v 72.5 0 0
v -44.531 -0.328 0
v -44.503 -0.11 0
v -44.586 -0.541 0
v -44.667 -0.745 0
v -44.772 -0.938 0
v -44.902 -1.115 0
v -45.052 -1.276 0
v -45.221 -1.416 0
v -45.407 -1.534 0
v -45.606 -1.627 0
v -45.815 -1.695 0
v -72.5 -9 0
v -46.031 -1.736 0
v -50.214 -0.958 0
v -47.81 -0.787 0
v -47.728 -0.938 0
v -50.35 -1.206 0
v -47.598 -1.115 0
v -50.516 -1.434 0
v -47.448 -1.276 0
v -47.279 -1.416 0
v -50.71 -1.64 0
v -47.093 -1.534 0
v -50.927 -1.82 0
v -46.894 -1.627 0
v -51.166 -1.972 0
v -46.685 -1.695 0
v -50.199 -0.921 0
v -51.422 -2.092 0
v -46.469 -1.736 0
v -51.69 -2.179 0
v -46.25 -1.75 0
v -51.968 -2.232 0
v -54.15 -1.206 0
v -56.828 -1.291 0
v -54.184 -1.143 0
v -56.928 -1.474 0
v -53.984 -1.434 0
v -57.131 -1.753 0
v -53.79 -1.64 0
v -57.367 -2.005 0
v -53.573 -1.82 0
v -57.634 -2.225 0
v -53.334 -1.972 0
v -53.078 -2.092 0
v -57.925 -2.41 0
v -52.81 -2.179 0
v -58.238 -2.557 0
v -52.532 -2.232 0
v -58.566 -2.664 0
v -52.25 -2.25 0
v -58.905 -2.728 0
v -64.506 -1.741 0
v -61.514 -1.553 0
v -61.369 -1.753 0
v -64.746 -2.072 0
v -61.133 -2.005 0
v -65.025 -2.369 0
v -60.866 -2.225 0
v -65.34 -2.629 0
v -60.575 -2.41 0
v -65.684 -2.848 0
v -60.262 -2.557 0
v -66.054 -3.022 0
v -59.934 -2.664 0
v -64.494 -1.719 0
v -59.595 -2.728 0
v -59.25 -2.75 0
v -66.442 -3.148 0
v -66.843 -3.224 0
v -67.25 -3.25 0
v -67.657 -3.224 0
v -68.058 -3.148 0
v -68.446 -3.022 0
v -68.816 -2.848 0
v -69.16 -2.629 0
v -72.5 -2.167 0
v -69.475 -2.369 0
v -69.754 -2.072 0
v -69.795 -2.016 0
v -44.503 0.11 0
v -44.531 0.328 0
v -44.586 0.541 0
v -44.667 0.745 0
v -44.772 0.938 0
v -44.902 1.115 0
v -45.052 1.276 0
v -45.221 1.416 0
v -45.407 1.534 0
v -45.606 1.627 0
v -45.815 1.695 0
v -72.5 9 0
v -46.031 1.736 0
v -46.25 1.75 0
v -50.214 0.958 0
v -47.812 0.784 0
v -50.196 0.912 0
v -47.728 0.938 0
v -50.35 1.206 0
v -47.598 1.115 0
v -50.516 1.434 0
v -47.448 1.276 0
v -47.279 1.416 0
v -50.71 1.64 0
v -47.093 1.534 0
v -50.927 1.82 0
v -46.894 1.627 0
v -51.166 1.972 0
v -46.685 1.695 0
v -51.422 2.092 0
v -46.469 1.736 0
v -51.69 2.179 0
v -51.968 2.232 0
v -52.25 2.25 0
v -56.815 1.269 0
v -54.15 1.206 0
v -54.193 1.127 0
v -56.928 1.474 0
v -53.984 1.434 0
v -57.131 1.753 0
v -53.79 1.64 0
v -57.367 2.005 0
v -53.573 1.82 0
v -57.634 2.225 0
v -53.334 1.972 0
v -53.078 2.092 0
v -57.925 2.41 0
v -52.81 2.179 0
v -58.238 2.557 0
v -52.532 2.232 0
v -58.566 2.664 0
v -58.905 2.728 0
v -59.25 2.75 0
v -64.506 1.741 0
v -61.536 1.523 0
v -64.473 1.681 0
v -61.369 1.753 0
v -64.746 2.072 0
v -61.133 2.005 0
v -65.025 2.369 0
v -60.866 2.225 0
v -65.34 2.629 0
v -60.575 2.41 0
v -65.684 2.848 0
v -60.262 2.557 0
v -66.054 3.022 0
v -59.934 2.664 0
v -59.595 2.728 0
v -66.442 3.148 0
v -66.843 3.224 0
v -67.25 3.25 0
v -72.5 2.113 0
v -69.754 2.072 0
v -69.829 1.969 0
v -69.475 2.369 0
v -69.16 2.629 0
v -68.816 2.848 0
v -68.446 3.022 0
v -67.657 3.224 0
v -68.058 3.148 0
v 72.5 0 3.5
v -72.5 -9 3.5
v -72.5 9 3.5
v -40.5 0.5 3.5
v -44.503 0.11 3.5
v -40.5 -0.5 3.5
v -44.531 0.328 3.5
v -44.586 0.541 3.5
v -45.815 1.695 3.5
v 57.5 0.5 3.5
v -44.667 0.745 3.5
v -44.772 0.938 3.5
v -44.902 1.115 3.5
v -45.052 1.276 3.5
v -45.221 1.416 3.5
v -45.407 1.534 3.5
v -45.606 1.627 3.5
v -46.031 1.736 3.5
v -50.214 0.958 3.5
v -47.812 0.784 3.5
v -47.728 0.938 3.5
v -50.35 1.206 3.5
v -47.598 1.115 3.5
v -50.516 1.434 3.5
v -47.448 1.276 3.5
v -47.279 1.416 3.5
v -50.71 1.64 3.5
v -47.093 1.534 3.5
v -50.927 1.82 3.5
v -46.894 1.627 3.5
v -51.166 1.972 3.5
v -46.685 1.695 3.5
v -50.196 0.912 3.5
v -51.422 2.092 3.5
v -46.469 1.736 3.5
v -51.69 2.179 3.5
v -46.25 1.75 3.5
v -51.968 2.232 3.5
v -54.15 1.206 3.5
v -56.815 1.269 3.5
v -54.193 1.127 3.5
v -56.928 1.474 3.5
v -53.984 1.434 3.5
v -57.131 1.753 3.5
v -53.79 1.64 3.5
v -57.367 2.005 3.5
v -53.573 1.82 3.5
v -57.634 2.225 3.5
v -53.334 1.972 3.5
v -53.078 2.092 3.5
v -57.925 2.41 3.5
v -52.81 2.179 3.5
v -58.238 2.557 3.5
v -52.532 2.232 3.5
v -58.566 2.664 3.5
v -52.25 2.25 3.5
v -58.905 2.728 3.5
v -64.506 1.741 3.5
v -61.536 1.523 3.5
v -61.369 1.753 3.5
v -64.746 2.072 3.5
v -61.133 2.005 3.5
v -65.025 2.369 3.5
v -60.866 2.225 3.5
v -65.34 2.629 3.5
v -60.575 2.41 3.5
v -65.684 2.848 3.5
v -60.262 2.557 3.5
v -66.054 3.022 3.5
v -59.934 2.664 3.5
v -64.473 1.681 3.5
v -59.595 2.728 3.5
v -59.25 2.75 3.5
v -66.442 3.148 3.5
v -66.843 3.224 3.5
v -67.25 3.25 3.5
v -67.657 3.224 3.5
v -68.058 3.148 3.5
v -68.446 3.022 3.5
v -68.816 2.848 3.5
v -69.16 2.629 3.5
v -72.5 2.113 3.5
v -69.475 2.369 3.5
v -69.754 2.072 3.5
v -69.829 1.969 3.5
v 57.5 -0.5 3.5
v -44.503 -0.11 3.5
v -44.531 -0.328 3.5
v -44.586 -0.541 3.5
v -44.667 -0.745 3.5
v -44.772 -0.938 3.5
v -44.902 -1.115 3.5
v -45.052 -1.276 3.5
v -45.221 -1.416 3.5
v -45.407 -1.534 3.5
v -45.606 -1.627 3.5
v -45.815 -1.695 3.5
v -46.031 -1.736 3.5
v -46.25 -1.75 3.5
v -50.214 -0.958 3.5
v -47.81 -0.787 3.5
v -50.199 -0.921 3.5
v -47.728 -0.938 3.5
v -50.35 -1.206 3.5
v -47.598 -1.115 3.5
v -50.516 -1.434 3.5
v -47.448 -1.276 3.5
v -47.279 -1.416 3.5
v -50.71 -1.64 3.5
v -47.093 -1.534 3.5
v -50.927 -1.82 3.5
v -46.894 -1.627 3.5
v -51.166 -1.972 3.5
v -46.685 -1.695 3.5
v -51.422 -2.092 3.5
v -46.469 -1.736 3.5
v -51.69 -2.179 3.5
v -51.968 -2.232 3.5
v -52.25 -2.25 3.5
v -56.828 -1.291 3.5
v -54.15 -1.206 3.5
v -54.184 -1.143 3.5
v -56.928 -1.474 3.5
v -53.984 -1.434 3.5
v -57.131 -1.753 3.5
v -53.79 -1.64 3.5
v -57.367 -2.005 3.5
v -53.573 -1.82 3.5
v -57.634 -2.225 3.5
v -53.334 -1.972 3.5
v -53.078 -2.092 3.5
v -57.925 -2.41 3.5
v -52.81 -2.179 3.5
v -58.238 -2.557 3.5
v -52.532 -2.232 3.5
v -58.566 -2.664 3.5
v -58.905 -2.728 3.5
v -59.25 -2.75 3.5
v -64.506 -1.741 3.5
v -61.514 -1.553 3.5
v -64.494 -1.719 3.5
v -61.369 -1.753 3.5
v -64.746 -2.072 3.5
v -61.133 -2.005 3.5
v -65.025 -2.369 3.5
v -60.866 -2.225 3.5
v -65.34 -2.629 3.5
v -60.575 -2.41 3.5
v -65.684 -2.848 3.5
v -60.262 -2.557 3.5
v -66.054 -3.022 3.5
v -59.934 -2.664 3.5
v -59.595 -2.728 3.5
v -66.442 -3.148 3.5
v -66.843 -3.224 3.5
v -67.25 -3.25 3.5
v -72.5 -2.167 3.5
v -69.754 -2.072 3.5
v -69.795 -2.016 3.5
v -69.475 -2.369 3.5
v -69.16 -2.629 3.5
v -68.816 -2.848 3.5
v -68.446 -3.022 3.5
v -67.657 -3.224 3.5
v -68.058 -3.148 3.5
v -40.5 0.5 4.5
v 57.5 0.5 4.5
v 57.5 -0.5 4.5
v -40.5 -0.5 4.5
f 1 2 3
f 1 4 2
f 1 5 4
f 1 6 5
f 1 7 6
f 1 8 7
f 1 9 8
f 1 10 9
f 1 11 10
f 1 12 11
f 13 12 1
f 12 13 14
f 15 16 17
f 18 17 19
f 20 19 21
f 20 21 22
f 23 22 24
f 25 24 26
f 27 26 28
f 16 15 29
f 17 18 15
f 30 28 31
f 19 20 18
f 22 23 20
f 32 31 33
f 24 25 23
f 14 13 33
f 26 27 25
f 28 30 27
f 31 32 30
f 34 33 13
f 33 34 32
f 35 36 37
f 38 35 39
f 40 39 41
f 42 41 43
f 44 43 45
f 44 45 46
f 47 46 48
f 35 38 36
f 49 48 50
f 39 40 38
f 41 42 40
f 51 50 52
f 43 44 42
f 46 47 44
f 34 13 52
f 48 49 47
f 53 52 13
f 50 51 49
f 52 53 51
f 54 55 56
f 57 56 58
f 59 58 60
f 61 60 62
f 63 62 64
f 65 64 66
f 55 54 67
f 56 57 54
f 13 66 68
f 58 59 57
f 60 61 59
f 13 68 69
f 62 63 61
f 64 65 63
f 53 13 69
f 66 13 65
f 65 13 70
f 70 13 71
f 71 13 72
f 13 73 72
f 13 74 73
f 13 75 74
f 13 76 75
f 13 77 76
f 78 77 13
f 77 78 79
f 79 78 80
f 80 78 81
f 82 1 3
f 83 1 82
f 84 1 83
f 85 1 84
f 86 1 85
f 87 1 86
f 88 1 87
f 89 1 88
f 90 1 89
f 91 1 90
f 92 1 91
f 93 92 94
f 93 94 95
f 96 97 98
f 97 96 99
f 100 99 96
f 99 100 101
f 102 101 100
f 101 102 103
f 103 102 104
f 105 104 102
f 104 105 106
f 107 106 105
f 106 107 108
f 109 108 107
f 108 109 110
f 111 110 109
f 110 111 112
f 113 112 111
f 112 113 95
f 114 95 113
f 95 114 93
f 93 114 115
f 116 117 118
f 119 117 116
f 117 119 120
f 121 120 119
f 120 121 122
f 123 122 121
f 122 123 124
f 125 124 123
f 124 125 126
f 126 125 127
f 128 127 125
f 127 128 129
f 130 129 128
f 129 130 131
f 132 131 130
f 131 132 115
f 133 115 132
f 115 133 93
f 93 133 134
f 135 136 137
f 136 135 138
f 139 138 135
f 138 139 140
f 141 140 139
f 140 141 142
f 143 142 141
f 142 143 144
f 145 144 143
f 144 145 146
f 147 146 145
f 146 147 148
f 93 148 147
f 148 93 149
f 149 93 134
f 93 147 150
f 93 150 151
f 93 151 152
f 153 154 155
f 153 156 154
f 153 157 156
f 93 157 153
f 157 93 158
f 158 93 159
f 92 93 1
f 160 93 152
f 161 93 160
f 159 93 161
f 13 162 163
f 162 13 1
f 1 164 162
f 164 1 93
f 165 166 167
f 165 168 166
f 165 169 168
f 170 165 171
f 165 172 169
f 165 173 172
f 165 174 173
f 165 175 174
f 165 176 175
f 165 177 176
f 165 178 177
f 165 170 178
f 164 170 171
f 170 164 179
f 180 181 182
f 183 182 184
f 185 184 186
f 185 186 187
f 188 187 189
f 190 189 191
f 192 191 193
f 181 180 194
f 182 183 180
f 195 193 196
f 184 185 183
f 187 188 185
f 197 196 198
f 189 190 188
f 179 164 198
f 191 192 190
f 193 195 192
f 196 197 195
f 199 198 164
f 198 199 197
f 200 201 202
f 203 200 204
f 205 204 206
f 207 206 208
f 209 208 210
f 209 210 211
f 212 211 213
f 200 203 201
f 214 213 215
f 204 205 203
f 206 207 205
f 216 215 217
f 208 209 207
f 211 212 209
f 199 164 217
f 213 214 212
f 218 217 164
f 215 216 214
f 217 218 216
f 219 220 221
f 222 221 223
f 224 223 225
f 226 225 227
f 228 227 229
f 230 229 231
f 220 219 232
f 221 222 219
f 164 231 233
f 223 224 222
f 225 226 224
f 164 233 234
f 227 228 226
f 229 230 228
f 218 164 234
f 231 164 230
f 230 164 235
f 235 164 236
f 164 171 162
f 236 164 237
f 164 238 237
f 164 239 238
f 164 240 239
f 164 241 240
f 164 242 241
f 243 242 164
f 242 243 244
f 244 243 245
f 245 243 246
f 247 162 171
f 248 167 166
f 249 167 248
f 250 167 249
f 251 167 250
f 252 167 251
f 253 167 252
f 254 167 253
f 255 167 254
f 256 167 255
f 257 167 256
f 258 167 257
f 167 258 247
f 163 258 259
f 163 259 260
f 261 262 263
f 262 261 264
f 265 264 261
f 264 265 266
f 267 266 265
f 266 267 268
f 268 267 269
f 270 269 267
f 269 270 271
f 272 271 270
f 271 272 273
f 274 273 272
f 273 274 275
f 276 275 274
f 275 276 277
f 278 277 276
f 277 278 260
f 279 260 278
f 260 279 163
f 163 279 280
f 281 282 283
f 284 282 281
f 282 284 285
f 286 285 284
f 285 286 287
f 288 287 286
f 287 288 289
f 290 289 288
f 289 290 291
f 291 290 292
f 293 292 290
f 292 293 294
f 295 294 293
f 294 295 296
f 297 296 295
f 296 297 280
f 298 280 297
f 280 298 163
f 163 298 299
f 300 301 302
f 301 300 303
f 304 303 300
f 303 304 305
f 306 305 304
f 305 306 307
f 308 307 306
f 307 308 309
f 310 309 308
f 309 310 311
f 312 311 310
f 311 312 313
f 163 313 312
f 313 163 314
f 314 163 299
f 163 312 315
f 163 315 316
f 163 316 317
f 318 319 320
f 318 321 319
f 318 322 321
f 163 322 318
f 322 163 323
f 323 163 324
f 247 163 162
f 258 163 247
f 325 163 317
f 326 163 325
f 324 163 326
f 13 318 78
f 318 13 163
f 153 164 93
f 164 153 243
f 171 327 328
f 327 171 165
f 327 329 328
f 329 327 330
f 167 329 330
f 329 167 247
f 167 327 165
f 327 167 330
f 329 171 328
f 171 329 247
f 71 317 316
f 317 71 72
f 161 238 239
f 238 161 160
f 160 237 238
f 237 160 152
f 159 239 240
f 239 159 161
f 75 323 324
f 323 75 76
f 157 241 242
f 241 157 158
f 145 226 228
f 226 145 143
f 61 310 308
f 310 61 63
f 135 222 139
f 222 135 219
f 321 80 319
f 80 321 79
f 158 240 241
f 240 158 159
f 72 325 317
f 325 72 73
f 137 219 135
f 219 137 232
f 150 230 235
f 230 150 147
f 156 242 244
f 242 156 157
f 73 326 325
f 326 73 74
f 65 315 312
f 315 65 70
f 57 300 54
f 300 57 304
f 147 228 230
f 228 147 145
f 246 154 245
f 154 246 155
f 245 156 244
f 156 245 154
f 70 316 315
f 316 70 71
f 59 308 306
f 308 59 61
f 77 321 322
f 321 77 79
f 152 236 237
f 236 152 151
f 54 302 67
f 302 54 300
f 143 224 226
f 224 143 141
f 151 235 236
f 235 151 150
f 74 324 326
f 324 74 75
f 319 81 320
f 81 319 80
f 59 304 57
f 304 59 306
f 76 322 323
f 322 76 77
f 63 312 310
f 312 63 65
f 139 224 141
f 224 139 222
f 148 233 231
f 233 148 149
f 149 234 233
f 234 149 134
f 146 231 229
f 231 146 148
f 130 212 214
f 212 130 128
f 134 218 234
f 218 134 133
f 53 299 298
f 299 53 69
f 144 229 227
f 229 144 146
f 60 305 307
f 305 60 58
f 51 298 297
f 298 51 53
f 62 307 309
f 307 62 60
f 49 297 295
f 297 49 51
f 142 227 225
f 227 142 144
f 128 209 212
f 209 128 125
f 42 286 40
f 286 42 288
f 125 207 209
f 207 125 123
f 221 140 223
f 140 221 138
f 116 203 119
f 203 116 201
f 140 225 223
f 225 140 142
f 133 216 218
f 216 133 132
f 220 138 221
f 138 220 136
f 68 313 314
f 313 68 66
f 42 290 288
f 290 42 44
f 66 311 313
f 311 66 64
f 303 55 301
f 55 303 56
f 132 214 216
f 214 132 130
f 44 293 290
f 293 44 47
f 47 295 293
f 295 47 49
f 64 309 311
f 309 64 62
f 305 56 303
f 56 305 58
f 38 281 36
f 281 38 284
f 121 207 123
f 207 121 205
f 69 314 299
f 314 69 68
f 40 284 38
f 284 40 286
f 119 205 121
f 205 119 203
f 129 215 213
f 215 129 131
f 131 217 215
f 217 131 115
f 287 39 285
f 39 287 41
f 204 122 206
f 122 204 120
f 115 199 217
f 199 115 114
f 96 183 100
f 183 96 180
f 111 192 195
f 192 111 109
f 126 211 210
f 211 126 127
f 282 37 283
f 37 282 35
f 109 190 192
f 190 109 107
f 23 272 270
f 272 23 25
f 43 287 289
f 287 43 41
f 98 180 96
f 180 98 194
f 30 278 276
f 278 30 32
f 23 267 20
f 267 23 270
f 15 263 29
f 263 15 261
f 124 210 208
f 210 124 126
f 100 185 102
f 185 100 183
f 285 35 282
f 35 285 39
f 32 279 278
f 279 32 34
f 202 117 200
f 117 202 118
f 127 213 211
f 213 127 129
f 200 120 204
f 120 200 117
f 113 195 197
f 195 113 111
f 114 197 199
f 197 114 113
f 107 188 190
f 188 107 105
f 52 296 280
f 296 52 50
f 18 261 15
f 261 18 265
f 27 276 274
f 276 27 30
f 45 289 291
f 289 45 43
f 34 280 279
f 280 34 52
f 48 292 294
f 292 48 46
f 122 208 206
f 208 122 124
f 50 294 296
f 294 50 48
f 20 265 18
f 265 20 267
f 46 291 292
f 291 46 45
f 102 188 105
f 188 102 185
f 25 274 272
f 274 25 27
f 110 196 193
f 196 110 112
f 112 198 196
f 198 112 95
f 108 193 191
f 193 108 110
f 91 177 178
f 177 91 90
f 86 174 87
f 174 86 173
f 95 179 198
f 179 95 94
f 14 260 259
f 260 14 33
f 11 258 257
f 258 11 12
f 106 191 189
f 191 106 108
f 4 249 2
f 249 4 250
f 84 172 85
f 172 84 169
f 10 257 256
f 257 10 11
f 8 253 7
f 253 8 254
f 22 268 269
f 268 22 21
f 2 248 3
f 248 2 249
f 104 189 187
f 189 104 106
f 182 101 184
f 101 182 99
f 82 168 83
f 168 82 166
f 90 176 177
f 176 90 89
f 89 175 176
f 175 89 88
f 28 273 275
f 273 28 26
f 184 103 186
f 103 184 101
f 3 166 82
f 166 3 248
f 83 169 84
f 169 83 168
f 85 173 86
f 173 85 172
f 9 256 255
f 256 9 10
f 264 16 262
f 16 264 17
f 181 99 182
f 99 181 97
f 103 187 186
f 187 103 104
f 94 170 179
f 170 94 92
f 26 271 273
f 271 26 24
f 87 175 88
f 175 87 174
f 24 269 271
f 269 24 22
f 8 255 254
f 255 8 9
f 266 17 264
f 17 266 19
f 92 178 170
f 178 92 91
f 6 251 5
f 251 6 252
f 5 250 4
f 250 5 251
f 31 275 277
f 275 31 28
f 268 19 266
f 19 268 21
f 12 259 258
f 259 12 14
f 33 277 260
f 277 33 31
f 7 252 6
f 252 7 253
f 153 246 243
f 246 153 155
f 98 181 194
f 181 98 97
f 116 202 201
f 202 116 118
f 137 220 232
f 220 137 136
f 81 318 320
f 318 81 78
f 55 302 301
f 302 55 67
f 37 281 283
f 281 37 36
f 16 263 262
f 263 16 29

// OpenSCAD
// Garden irrigation hose stake 2 by Brian Enigma

// This is the thickest part, up at the top of the stake
OUTSIDE_DIAMETER = 18;

// This is the overall length of the stake
LENGTH = 145;

// This is the height (or thickness, depending on how you look at it) of the
// tallest part of the stake -- the bar running its length.
HEIGHT = 4.5;

// This is the thickness of all the rest of the stake that isn't a reinforcing
// ring or bar.
THICKNESS = 3.5;

// These are the diameters of the four circles.
CIRCLE1 = 6.5;
CIRCLE2 = 5.5;
CIRCLE3 = 4.5;
CIRCLE4 = 3.5;

// The detail (number of sides) of the circles.
DETAIL = 50;

// ######################################################################

CIRCLE1_OFFSET = CIRCLE1 / 2 + 2;
CIRCLE2_OFFSET = CIRCLE1 + 2 + CIRCLE2 / 2 + 2;
CIRCLE3_OFFSET = CIRCLE1 + 2 + CIRCLE2 + 2 + CIRCLE3 / 2 + 2;
CIRCLE4_OFFSET = CIRCLE1 + 2 + CIRCLE2 + 2 + CIRCLE3 + 2 + CIRCLE4 / 2 + 2;
BAR_OFFSET = CIRCLE4_OFFSET + CIRCLE4 / 2 + 4;
BAR_LENGTH = LENGTH - BAR_OFFSET - 15;

module body()
{
    union()
    {
        linear_extrude(height = THICKNESS)
            polygon(points = [[OUTSIDE_DIAMETER / 2, 0], [0, -1 * LENGTH], [OUTSIDE_DIAMETER / -2, 0]]);
        translate(v = [ -0.5, -1 * BAR_OFFSET - BAR_LENGTH, 0 ]) cube(size = [ 1, BAR_LENGTH, HEIGHT ]);
    }
}

module holes()
{
    translate(v = [ 0, -1 * CIRCLE1_OFFSET, -1 ]) cylinder(h = HEIGHT + 2, r = CIRCLE1 / 2, $fn = DETAIL);
    translate(v = [ 0, -1 * CIRCLE2_OFFSET, -1 ]) cylinder(h = HEIGHT + 2, r = CIRCLE2 / 2, $fn = DETAIL);
    translate(v = [ 0, -1 * CIRCLE3_OFFSET, -1 ]) cylinder(h = HEIGHT + 2, r = CIRCLE3 / 2, $fn = DETAIL);
    translate(v = [ 0, -1 * CIRCLE4_OFFSET, -1 ]) cylinder(h = HEIGHT + 2, r = CIRCLE4 / 2, $fn = DETAIL);
    translate(v = [ 0, 0, -1 ]) linear_extrude(height = THICKNESS + 2)
        polygon(points = [[CIRCLE1 / 3, 1], [CIRCLE4 / 5, -1 * CIRCLE4_OFFSET], [CIRCLE4 / -5, -1 * CIRCLE4_OFFSET],
                          [CIRCLE1 / -3, 0]]);
}

translate(v = [ LENGTH / -2, 0, 0 ]) rotate(a = [ 0, 0, 90 ]) difference()
{
    body();
    holes();
}
